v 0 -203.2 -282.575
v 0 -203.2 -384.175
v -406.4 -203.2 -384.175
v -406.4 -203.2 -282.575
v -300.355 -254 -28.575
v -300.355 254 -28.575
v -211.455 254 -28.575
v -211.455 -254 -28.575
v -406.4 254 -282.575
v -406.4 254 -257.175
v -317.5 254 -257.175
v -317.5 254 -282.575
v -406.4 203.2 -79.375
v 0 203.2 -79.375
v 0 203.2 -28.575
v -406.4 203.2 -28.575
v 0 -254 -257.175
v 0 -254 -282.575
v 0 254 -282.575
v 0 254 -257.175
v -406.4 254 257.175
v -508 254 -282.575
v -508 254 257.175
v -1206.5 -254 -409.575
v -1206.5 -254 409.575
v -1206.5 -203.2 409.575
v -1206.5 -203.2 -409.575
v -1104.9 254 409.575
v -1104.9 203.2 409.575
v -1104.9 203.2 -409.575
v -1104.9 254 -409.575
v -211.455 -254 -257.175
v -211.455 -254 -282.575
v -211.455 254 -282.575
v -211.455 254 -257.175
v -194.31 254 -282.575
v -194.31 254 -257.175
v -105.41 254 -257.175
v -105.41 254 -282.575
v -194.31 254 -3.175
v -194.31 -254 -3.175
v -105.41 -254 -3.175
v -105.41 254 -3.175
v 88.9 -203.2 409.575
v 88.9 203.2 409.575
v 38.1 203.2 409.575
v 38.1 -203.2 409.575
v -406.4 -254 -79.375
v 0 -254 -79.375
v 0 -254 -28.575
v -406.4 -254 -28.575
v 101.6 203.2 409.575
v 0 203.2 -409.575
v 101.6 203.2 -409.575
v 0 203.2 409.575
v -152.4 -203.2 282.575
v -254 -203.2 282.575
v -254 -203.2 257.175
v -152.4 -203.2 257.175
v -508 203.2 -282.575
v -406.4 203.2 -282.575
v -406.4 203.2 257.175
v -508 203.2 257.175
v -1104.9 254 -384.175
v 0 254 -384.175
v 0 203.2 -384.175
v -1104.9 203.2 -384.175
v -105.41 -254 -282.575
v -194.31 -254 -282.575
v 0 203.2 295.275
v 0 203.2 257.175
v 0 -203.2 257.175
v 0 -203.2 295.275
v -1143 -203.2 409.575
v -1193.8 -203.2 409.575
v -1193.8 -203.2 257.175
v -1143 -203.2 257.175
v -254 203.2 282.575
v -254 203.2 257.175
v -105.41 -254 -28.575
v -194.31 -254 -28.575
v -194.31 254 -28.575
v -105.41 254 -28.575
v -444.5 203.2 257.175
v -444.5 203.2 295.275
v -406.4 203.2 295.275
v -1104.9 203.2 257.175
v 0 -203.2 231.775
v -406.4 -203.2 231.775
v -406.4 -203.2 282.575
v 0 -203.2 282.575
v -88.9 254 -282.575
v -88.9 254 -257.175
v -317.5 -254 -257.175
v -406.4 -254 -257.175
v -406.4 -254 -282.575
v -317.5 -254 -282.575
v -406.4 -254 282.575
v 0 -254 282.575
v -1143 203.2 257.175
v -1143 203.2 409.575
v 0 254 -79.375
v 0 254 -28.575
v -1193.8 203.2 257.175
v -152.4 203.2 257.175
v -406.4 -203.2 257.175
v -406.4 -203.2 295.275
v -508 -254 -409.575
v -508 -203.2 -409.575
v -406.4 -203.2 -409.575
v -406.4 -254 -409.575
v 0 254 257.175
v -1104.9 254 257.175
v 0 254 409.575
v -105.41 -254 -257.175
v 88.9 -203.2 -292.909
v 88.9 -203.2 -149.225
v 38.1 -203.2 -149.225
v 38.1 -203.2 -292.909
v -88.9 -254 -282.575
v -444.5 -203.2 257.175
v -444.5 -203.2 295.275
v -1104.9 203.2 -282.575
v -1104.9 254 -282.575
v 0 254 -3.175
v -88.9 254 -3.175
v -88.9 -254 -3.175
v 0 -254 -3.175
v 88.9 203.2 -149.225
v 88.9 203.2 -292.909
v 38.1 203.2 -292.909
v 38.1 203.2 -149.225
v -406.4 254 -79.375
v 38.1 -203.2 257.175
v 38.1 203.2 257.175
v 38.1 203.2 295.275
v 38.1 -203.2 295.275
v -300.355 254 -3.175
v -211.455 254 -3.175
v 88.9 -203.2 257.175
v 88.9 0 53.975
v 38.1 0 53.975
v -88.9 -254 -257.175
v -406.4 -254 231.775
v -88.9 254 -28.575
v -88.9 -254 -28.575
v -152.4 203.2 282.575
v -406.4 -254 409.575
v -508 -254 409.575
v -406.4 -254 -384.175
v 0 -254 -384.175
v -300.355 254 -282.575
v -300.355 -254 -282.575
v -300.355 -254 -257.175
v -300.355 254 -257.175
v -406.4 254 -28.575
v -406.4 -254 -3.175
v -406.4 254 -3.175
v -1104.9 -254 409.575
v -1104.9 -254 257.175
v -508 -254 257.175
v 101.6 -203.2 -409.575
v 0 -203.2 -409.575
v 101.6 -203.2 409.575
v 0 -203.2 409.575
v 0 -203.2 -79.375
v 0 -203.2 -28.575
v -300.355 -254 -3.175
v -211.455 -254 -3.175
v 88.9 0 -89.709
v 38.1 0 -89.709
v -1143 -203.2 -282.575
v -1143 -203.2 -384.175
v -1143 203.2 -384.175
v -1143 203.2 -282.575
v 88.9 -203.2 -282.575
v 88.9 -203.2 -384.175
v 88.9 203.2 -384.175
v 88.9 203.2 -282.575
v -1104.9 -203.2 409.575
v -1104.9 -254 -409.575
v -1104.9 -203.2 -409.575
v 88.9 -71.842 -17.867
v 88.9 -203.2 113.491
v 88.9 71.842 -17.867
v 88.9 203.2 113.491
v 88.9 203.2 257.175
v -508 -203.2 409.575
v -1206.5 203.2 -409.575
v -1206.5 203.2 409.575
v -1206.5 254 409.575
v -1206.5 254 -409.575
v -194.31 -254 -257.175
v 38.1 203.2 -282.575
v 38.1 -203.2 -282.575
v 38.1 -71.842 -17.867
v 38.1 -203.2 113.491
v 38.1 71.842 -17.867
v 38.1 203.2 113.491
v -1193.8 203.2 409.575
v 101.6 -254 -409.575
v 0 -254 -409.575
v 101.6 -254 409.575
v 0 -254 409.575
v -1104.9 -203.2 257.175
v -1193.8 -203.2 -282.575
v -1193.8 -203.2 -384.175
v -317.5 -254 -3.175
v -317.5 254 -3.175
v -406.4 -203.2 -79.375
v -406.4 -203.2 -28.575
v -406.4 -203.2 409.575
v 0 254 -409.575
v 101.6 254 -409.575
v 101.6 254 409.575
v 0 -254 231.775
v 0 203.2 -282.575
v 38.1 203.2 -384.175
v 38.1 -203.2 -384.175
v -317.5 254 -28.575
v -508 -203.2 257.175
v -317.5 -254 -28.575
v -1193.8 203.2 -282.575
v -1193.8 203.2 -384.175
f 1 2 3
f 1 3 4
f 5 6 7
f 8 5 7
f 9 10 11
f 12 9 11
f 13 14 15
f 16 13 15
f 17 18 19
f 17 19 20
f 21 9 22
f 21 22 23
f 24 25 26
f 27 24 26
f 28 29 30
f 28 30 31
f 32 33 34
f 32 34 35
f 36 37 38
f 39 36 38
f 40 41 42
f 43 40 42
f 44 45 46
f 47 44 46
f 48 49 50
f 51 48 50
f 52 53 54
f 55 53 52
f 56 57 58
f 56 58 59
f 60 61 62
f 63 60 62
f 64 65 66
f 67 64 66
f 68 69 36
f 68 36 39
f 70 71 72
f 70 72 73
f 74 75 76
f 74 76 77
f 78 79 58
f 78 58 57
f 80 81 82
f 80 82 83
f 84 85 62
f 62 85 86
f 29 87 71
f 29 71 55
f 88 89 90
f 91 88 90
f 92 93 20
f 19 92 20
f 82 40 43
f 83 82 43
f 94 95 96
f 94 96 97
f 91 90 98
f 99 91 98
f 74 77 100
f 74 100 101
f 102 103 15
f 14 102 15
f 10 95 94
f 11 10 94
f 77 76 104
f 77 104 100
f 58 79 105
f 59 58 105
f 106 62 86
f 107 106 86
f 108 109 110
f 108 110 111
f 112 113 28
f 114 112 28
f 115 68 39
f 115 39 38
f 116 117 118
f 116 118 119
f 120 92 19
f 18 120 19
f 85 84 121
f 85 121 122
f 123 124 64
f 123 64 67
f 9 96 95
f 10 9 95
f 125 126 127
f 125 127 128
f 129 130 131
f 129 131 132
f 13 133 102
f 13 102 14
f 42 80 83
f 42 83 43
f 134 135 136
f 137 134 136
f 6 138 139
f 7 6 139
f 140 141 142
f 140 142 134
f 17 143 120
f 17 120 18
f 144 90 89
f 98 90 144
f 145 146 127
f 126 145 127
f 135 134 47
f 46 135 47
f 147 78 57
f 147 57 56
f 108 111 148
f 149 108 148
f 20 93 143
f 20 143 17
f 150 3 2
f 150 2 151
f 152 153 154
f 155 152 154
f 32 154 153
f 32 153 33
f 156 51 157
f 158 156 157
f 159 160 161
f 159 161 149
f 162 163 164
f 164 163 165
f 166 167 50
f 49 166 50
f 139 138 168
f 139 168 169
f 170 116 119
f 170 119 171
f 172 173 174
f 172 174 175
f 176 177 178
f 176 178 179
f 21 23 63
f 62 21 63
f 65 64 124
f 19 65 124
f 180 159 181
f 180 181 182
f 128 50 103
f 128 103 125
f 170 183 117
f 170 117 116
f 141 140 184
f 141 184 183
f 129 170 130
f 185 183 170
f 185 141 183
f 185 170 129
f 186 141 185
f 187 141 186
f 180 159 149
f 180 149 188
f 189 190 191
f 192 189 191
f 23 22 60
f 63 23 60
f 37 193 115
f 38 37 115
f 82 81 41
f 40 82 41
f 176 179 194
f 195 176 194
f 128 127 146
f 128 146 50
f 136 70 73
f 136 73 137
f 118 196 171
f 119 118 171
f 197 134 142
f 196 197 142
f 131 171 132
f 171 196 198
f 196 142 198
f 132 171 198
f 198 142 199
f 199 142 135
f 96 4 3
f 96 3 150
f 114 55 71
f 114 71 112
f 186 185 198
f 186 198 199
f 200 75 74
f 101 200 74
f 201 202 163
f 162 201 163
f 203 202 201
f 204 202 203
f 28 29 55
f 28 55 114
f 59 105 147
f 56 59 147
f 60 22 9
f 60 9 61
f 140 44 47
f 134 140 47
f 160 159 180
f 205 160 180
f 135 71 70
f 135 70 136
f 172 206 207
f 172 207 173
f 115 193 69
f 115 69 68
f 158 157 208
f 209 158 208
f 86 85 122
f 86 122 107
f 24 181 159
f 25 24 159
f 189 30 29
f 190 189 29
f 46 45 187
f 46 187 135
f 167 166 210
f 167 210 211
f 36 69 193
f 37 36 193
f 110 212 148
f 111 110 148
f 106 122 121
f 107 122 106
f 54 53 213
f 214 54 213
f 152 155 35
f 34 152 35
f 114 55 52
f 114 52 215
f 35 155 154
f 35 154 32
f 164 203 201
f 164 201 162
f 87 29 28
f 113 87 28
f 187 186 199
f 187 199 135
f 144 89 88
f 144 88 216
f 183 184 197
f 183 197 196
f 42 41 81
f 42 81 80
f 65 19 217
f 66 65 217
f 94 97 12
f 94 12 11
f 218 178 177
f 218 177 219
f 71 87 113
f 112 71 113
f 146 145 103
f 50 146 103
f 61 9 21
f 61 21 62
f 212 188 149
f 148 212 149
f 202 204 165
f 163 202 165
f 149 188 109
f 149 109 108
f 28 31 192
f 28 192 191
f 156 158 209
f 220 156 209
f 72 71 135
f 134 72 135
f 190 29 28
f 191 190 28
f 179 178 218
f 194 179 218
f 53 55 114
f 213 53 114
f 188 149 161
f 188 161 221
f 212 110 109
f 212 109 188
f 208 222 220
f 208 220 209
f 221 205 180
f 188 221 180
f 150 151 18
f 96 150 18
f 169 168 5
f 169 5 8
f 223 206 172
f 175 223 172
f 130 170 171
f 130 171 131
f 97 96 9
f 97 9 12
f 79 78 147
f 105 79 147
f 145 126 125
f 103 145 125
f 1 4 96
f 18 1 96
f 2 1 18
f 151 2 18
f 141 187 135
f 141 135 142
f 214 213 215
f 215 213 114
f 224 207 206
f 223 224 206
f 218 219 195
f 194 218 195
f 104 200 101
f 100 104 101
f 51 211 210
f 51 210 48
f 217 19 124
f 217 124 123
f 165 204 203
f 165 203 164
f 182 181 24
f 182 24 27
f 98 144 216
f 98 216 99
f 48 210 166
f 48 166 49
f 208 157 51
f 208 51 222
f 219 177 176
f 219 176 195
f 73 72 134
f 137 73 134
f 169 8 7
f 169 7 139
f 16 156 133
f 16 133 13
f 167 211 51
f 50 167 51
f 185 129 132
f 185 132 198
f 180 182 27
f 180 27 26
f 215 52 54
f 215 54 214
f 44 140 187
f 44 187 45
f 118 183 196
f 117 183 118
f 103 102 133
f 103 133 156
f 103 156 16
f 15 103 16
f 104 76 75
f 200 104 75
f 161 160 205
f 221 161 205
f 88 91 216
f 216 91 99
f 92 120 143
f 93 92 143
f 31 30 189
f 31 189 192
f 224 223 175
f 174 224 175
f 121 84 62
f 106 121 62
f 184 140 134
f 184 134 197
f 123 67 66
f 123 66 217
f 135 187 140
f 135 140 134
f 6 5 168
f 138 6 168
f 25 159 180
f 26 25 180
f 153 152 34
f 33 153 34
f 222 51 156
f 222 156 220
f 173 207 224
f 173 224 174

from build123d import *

# Parameters (mm, degrees)
F0_W      = 50.8
F0_H      = 819.15
F1_DEPTH  = 101.6
F2_W      = 50.8
F2_H      = 152.4
F3_DEPTH  = 406.4
F2_H_2    = 101.6
F5_DEPTH  = 50.8
F9_W      = 50.8
F9_H      = 50.8
F10_DEPTH = 406.4
F6_W      = 50.8
F6_H      = 101.6
F12_DEPTH = 1104.9
F11_W     = 50.8
F11_H     = 819.15
F13_DEPTH = 101.6
F11_H_2   = 539.75
F14_W     = 88.9
F14_H     = 25.4
F15_DEPTH = 508
F16_DEPTH = 406.4
F17_W     = 50.8
F17_H     = 152.4
F18_DEPTH = 596.9
F19_DEPTH = 1104.9
F20_W     = 101.6
F20_H     = 25.4
F21_DEPTH = 406.4
F20_W_2   = 38.0999999999
F20_H_2   = 38.1
F20_W_3   = 38.1


# Not quite as in the source:
# - a feature names something its author has since deleted; it is built from what else it names


with BuildPart() as f1:
    # F0 (on Right) → F1 (new body)
    with BuildSketch(Plane.YZ):
        with Locations((-228.6, 0)):
            Rectangle(F0_W, F0_H)
    extrude(amount=F1_DEPTH)


with BuildPart() as f1b:
    # F0 (on Right) → F1, piece 2 (new body)
    with BuildSketch(Plane.YZ):
        with Locations((228.6, 0)):
            Rectangle(F0_W, F0_H)
    extrude(amount=F1_DEPTH)


with BuildPart() as f3:
    # F2 (on face) → F3 (new body, through all)
    with BuildSketch(Plane(origin=(0, -203.2, 0), x_dir=(-1, 0, 0), z_dir=(0, 1, 0))):
        with Locations((-63.5, 333.375)):
            Rectangle(F2_W, F2_H)
    extrude(amount=F3_DEPTH)


with BuildPart() as f3b:
    # F2 (on face) → F3, piece 2 (new body, through all)
    with BuildSketch(Plane(origin=(0, -203.2, 0), x_dir=(-1, 0, 0), z_dir=(0, 1, 0))):
        with Locations((-63.5, -333.375)):
            Rectangle(F2_W, F2_H_2)
    extrude(amount=F3_DEPTH)


with BuildPart() as f5:
    # F4 (on face) → F5 (new body)
    with BuildSketch(Plane.YZ.offset(88.9)):
        Polygon((0, 53.975), (-203.2, 257.175), (-203.2, 113.4909020629), (-71.8420489686, -17.8670489685), (0, -89.7090979371), (203.2, -292.9090979371), (203.2, -149.225), (71.8420489685, -17.8670489685), align=None)
        Polygon((203.2, 257.175), (0, 53.975), (71.8420489685, -17.8670489685), (203.2, 113.4909020629), align=None)
        Polygon((0, -89.7090979371), (-71.8420489686, -17.8670489685), (-203.2, -149.225), (-203.2, -292.9090979371), align=None)
    extrude(amount=-F5_DEPTH)


with BuildPart() as f8_1:
    # F8: instance of F1b
    add(f1b.part.mirror(Plane(origin=(-552.45, -228.6, 0), x_dir=(0, 1, 0), z_dir=(-1, 0, 0))))


with BuildPart() as f8_2:
    # F8: instance of F3
    add(f3.part.mirror(Plane(origin=(-552.45, -228.6, 0), x_dir=(0, 1, 0), z_dir=(-1, 0, 0))))


with BuildPart() as f8_3:
    # F8: instance of F1
    add(f1.part.mirror(Plane(origin=(-552.45, -228.6, 0), x_dir=(0, 1, 0), z_dir=(-1, 0, 0))))


with BuildPart() as f8_4:
    # F8: instance of F3b
    add(f3b.part.mirror(Plane(origin=(-552.45, -228.6, 0), x_dir=(0, 1, 0), z_dir=(-1, 0, 0))))


with BuildPart() as f10:
    # F9 (on face) → F10 (new body)
    with BuildSketch(Plane(origin=(0, 0, 0), x_dir=(0, -1, 0), z_dir=(-1, 0, 0))):
        with Locations((228.6, 257.175)):
            Rectangle(F9_W, F9_H)
    extrude(amount=F10_DEPTH)


with BuildPart() as f10b:
    # F9 (on face) → F10, piece 2 (new body)
    with BuildSketch(Plane(origin=(0, 0, 0), x_dir=(0, -1, 0), z_dir=(-1, 0, 0))):
        with Locations((228.6, -53.975)):
            Rectangle(F9_W, F9_H)
    extrude(amount=F10_DEPTH)


with BuildPart() as f10c:
    # F9 (on face) → F10, piece 3 (new body)
    with BuildSketch(Plane(origin=(0, 0, 0), x_dir=(0, -1, 0), z_dir=(-1, 0, 0))):
        with Locations((-228.6, -53.975)):
            Rectangle(F9_W, F9_H)
    extrude(amount=F10_DEPTH)


with BuildPart() as f12:
    # F6 (on face) → F12 (new body, through all)
    with BuildSketch(Plane(origin=(0, 0, 0), x_dir=(0, -1, 0), z_dir=(-1, 0, 0))):
        with Locations((-228.6, -333.375)):
            Rectangle(F6_W, F6_H)
    extrude(amount=F12_DEPTH)


with BuildPart() as f13:
    # F11 (on face) → F13 (new body)
    with BuildSketch(Plane(origin=(-406.4, 0, 0), x_dir=(0, -1, 0), z_dir=(-1, 0, 0))):
        with Locations((228.6, 0)):
            Rectangle(F11_W, F11_H)
    extrude(amount=F13_DEPTH)


with BuildPart() as f13b:
    # F11 (on face) → F13, piece 2 (new body)
    with BuildSketch(Plane(origin=(-406.4, 0, 0), x_dir=(0, -1, 0), z_dir=(-1, 0, 0))):
        with Locations((-228.6, -12.7)):
            Rectangle(F11_W, F11_H_2)
    extrude(amount=F13_DEPTH)


with BuildPart() as f15:
    # F14 (on face) → F15 (new body, through all)
    with BuildSketch(Plane.XZ.offset(254)):
        with Locations((-44.45, -15.875)):
            Rectangle(F14_W, F14_H)
    extrude(amount=-F15_DEPTH)


with BuildPart() as f15b:
    # F14 (on face) → F15, piece 2 (new body, through all)
    with BuildSketch(Plane.XZ.offset(254)):
        with Locations((-361.95, -15.875)):
            Rectangle(F14_W, F14_H)
    extrude(amount=-F15_DEPTH)


with BuildPart() as f15c:
    # F14 (on face) → F15, piece 3 (new body, through all)
    with BuildSketch(Plane.XZ.offset(254)):
        with Locations((-255.905, -15.875)):
            Rectangle(F14_W, F14_H)
    extrude(amount=-F15_DEPTH)


with BuildPart() as f15d:
    # F14 (on face) → F15, piece 4 (new body, through all)
    with BuildSketch(Plane.XZ.offset(254)):
        with Locations((-149.86, -15.875)):
            Rectangle(F14_W, F14_H)
    extrude(amount=-F15_DEPTH)


with BuildPart() as f15e:
    # F14 (on face) → F15, piece 5 (new body, through all)
    with BuildSketch(Plane.XZ.offset(254)):
        with Locations((-44.45, -269.875)):
            Rectangle(F14_W, F14_H)
    extrude(amount=-F15_DEPTH)


with BuildPart() as f15f:
    # F14 (on face) → F15, piece 6 (new body, through all)
    with BuildSketch(Plane.XZ.offset(254)):
        with Locations((-361.95, -269.875)):
            Rectangle(F14_W, F14_H)
    extrude(amount=-F15_DEPTH)


with BuildPart() as f15g:
    # F14 (on face) → F15, piece 7 (new body, through all)
    with BuildSketch(Plane.XZ.offset(254)):
        with Locations((-255.905, -269.875)):
            Rectangle(F14_W, F14_H)
    extrude(amount=-F15_DEPTH)


with BuildPart() as f15h:
    # F14 (on face) → F15, piece 8 (new body, through all)
    with BuildSketch(Plane.XZ.offset(254)):
        with Locations((-149.86, -269.875)):
            Rectangle(F14_W, F14_H)
    extrude(amount=-F15_DEPTH)


with BuildPart() as f16:
    # F6 (on face) → F16 (new body, through all)
    with BuildSketch(Plane(origin=(0, 0, 0), x_dir=(0, -1, 0), z_dir=(-1, 0, 0))):
        with Locations((228.6, -333.375)):
            Rectangle(F6_W, F6_H)
    extrude(amount=F16_DEPTH)


with BuildPart() as f18:
    # F17 (on face) → F18 (new body, through all)
    with BuildSketch(Plane.YZ.offset(-1104.9)):
        with Locations((-228.6, 333.375)):
            Rectangle(F17_W, F17_H)
    extrude(amount=F18_DEPTH)


with BuildPart() as f19:
    # F17 (on face) → F19 (new body, through all)
    with BuildSketch(Plane.YZ.offset(-1104.9)):
        with Locations((228.6, 333.375)):
            Rectangle(F17_W, F17_H)
    extrude(amount=F19_DEPTH)


with BuildPart() as f21:
    # F20 (on face) → F21 (new body, through all)
    with BuildSketch(Plane.XZ.offset(-203.2)):
        with Locations((-203.2, 269.875)):
            Rectangle(F20_W, F20_H)
    extrude(amount=F21_DEPTH)


with BuildPart() as f21b:
    # F20 (on face) → F21, piece 2 (new body, through all)
    with BuildSketch(Plane.XZ.offset(-203.2)):
        with Locations((19.0500000001, 276.225)):
            Rectangle(F20_W_2, F20_H_2)
    extrude(amount=F21_DEPTH)


with BuildPart() as f21c:
    # F20 (on face) → F21, piece 3 (new body, through all)
    with BuildSketch(Plane.XZ.offset(-203.2)):
        with Locations((-425.45, 276.225)):
            Rectangle(F20_W_3, F20_H_2)
    extrude(amount=F21_DEPTH)


solid = Compound([f1.part, f1b.part, f3.part, f3b.part, f5.part, f8_1.part, f8_2.part, f8_3.part, f8_4.part, f10.part, f10b.part, f10c.part, f12.part, f13.part, f13b.part, f15.part, f15b.part, f15c.part, f15d.part, f15e.part, f15f.part, f15g.part, f15h.part, f16.part, f18.part, f19.part, f21.part, f21b.part, f21c.part])
